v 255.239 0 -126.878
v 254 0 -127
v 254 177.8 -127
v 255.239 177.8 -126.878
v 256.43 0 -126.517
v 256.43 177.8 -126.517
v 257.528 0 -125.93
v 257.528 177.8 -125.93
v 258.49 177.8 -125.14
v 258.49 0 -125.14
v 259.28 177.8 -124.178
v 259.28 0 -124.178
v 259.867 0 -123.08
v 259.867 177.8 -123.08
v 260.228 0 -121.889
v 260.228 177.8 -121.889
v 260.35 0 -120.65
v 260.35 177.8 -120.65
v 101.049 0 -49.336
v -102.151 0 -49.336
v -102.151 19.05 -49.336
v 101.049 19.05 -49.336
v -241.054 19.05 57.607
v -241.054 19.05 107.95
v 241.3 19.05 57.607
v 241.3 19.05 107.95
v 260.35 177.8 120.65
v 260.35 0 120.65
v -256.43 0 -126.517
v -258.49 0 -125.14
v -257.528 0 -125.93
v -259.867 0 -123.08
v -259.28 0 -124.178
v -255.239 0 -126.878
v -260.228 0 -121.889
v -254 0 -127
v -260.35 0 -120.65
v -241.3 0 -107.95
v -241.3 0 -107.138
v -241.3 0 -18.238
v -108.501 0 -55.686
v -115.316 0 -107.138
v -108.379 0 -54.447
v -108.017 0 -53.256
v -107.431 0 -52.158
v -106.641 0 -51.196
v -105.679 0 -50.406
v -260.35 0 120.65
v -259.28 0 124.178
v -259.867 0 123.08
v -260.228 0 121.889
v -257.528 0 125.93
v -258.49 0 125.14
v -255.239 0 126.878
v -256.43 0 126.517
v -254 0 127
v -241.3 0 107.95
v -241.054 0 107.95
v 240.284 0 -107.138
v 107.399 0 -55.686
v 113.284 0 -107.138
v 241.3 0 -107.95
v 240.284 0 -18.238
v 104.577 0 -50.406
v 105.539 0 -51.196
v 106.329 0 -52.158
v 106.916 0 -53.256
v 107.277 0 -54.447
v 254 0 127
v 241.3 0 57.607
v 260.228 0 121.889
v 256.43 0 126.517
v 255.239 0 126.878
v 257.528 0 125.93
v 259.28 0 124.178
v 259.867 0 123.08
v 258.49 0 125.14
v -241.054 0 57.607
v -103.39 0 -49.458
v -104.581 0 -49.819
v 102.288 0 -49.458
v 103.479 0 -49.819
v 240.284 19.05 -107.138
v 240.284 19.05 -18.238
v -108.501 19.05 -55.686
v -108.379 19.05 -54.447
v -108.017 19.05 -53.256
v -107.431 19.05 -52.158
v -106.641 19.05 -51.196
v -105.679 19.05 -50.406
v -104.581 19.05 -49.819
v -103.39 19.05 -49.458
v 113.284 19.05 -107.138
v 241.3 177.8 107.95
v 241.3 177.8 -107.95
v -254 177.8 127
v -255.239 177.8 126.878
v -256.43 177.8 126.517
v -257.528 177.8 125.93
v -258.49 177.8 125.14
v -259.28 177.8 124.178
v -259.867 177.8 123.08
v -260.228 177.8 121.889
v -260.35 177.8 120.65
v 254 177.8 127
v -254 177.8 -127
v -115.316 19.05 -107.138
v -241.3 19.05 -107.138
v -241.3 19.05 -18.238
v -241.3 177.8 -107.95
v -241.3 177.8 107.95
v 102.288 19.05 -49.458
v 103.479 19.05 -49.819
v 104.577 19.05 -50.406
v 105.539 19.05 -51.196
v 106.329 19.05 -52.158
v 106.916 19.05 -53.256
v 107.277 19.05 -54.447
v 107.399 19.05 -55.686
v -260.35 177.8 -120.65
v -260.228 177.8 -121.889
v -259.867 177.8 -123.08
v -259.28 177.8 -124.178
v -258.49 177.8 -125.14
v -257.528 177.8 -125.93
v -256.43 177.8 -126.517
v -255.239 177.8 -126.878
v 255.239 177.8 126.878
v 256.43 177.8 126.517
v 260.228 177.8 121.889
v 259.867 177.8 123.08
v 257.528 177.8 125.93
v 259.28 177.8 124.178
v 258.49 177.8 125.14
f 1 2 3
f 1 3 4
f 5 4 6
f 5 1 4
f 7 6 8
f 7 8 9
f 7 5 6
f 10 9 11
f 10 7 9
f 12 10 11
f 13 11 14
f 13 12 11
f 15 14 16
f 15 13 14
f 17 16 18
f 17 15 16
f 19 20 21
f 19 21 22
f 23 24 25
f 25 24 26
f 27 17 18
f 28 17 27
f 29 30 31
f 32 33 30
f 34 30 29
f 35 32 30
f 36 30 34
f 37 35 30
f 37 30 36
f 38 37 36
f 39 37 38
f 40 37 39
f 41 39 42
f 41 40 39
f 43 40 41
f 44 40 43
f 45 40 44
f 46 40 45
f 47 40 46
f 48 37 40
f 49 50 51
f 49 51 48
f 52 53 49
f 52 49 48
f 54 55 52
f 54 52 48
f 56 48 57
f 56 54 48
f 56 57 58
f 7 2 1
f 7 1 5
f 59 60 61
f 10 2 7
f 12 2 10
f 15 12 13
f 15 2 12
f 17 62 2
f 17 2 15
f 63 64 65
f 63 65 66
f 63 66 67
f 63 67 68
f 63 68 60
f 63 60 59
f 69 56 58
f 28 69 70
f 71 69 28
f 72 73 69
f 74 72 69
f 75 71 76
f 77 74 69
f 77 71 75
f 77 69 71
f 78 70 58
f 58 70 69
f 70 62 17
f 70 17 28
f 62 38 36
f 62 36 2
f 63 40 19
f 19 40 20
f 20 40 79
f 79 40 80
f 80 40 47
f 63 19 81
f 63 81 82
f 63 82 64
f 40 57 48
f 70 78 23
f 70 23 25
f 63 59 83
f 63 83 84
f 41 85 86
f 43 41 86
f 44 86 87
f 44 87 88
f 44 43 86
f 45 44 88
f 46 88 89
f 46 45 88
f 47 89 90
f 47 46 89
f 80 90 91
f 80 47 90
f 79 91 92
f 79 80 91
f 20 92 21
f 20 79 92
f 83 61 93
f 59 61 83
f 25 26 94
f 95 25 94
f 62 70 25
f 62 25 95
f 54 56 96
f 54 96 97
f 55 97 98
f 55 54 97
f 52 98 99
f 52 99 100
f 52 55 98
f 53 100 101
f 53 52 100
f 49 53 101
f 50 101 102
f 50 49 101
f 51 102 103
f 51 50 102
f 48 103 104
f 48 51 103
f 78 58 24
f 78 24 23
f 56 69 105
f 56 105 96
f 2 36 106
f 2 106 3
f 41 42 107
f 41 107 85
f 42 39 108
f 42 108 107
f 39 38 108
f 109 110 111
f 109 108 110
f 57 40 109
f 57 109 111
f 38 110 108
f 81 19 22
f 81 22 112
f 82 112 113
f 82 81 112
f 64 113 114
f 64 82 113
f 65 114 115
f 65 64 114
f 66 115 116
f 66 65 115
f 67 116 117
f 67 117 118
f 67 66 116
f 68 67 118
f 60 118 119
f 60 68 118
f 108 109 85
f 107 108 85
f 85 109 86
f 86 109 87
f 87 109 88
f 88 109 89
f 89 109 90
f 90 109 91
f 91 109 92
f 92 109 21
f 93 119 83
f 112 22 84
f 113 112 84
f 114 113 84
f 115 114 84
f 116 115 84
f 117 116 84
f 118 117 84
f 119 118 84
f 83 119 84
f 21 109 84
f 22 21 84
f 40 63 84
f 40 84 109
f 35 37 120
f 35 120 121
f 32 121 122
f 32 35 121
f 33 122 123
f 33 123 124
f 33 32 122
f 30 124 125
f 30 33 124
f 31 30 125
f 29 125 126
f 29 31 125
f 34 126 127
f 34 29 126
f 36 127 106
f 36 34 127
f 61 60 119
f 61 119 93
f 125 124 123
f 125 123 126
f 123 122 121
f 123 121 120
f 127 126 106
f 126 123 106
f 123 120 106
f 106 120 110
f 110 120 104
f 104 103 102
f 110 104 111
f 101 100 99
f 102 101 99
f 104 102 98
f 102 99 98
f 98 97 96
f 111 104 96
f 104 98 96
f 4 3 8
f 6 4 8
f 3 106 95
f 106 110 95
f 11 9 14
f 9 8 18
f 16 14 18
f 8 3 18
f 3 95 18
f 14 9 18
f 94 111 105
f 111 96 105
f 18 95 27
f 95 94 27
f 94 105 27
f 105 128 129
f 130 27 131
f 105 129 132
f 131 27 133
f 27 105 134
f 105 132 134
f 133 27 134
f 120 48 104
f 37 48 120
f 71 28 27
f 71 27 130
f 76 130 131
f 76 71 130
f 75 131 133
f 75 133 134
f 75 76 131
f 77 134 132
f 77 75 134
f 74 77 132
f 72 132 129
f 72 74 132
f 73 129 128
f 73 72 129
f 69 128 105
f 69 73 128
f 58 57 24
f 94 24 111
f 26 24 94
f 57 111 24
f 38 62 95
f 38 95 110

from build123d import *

# Parameters (mm, degrees)
F2_DEPTH = 177.8
F3_DEPTH = 19.05
F1_W     = 482.6
F1_H     = 50.8
F4_DEPTH = 19.05


# Not quite as in the source:
# - a feature names something its author has since deleted; it is built from what else it names


with BuildPart() as f2:
    # F0 (on Front) → F2 (new body)
    with BuildSketch(Plane.XZ):
        with BuildLine():
            Line((-254, -127), (254, -127))
            ThreePointArc((254, -127), (258.4901280605, -125.1401280605), (260.35, -120.65))
            Line((260.35, -120.65), (260.35, 120.65))
            ThreePointArc((260.35, 120.65), (258.4901280605, 125.1401280605), (254, 127))
            Line((254, 127), (-254, 127))
            ThreePointArc((-254, 127), (-258.4901280605, 125.1401280605), (-260.35, 120.65))
            Line((-260.35, 120.65), (-260.35, -120.65))
            ThreePointArc((-260.35, -120.65), (-258.4901280605, -125.1401280605), (-254, -127))
        make_face()
        Polygon((222.25, 107.95), (241.3, 107.95), (241.3, -107.95), (222.25, -107.95), (-222.25, -107.95), (-241.3, -107.95), (-241.3, 107.95), (-222.25, 107.95), align=None, mode=Mode.SUBTRACT)
    extrude(amount=-F2_DEPTH)

    # F1 (on face) → F3 (join)
    with BuildSketch(Plane.XZ):
        Polygon((-222.25, 107.95), (-241.0535812378, 107.95), (-241.0535812378, 57.6071217656), (241.3, 57.6071217656), (241.3, 107.95), (222.25, 107.95), align=None)
    extrude(amount=-F3_DEPTH)

    # F1 (on face) → F4 (join)
    with BuildSketch(Plane.XZ):
        with Locations((0.2464187622, 83.0071217656)):
            Rectangle(F1_W, F1_H)
        with BuildLine():
            Line((-102.1507469177, -49.3358883619), (-0.5507469177, -49.3358883619))
            Line((-0.5507469177, -49.3358883619), (101.0492530823, -49.3358883619))
            ThreePointArc((101.0492530823, -49.3358883619), (105.5393811428, -51.1957603014), (107.3992530823, -55.6858883619))
            Line((107.3992530823, -55.6858883619), (113.2842159033, -107.1381363198))
            Line((113.2842159033, -107.1381363198), (240.2842159033, -107.1381363198))
            Line((240.2842159033, -107.1381363198), (240.2842159033, -18.2381363198))
            Line((240.2842159033, -18.2381363198), (-242.3157840967, -18.2381363198))
            Line((-242.3157840967, -18.2381363198), (-242.3157840967, -107.1381363198))
            Line((-242.3157840967, -107.1381363198), (-115.3157840967, -107.1381363198))
            Line((-115.3157840967, -107.1381363198), (-108.5007469177, -55.6858883619))
            ThreePointArc((-108.5007469177, -55.6858883619), (-106.6408749783, -51.1957603014), (-102.1507469177, -49.3358883619))
        make_face()
    extrude(amount=-F4_DEPTH)


solid = f2.part
